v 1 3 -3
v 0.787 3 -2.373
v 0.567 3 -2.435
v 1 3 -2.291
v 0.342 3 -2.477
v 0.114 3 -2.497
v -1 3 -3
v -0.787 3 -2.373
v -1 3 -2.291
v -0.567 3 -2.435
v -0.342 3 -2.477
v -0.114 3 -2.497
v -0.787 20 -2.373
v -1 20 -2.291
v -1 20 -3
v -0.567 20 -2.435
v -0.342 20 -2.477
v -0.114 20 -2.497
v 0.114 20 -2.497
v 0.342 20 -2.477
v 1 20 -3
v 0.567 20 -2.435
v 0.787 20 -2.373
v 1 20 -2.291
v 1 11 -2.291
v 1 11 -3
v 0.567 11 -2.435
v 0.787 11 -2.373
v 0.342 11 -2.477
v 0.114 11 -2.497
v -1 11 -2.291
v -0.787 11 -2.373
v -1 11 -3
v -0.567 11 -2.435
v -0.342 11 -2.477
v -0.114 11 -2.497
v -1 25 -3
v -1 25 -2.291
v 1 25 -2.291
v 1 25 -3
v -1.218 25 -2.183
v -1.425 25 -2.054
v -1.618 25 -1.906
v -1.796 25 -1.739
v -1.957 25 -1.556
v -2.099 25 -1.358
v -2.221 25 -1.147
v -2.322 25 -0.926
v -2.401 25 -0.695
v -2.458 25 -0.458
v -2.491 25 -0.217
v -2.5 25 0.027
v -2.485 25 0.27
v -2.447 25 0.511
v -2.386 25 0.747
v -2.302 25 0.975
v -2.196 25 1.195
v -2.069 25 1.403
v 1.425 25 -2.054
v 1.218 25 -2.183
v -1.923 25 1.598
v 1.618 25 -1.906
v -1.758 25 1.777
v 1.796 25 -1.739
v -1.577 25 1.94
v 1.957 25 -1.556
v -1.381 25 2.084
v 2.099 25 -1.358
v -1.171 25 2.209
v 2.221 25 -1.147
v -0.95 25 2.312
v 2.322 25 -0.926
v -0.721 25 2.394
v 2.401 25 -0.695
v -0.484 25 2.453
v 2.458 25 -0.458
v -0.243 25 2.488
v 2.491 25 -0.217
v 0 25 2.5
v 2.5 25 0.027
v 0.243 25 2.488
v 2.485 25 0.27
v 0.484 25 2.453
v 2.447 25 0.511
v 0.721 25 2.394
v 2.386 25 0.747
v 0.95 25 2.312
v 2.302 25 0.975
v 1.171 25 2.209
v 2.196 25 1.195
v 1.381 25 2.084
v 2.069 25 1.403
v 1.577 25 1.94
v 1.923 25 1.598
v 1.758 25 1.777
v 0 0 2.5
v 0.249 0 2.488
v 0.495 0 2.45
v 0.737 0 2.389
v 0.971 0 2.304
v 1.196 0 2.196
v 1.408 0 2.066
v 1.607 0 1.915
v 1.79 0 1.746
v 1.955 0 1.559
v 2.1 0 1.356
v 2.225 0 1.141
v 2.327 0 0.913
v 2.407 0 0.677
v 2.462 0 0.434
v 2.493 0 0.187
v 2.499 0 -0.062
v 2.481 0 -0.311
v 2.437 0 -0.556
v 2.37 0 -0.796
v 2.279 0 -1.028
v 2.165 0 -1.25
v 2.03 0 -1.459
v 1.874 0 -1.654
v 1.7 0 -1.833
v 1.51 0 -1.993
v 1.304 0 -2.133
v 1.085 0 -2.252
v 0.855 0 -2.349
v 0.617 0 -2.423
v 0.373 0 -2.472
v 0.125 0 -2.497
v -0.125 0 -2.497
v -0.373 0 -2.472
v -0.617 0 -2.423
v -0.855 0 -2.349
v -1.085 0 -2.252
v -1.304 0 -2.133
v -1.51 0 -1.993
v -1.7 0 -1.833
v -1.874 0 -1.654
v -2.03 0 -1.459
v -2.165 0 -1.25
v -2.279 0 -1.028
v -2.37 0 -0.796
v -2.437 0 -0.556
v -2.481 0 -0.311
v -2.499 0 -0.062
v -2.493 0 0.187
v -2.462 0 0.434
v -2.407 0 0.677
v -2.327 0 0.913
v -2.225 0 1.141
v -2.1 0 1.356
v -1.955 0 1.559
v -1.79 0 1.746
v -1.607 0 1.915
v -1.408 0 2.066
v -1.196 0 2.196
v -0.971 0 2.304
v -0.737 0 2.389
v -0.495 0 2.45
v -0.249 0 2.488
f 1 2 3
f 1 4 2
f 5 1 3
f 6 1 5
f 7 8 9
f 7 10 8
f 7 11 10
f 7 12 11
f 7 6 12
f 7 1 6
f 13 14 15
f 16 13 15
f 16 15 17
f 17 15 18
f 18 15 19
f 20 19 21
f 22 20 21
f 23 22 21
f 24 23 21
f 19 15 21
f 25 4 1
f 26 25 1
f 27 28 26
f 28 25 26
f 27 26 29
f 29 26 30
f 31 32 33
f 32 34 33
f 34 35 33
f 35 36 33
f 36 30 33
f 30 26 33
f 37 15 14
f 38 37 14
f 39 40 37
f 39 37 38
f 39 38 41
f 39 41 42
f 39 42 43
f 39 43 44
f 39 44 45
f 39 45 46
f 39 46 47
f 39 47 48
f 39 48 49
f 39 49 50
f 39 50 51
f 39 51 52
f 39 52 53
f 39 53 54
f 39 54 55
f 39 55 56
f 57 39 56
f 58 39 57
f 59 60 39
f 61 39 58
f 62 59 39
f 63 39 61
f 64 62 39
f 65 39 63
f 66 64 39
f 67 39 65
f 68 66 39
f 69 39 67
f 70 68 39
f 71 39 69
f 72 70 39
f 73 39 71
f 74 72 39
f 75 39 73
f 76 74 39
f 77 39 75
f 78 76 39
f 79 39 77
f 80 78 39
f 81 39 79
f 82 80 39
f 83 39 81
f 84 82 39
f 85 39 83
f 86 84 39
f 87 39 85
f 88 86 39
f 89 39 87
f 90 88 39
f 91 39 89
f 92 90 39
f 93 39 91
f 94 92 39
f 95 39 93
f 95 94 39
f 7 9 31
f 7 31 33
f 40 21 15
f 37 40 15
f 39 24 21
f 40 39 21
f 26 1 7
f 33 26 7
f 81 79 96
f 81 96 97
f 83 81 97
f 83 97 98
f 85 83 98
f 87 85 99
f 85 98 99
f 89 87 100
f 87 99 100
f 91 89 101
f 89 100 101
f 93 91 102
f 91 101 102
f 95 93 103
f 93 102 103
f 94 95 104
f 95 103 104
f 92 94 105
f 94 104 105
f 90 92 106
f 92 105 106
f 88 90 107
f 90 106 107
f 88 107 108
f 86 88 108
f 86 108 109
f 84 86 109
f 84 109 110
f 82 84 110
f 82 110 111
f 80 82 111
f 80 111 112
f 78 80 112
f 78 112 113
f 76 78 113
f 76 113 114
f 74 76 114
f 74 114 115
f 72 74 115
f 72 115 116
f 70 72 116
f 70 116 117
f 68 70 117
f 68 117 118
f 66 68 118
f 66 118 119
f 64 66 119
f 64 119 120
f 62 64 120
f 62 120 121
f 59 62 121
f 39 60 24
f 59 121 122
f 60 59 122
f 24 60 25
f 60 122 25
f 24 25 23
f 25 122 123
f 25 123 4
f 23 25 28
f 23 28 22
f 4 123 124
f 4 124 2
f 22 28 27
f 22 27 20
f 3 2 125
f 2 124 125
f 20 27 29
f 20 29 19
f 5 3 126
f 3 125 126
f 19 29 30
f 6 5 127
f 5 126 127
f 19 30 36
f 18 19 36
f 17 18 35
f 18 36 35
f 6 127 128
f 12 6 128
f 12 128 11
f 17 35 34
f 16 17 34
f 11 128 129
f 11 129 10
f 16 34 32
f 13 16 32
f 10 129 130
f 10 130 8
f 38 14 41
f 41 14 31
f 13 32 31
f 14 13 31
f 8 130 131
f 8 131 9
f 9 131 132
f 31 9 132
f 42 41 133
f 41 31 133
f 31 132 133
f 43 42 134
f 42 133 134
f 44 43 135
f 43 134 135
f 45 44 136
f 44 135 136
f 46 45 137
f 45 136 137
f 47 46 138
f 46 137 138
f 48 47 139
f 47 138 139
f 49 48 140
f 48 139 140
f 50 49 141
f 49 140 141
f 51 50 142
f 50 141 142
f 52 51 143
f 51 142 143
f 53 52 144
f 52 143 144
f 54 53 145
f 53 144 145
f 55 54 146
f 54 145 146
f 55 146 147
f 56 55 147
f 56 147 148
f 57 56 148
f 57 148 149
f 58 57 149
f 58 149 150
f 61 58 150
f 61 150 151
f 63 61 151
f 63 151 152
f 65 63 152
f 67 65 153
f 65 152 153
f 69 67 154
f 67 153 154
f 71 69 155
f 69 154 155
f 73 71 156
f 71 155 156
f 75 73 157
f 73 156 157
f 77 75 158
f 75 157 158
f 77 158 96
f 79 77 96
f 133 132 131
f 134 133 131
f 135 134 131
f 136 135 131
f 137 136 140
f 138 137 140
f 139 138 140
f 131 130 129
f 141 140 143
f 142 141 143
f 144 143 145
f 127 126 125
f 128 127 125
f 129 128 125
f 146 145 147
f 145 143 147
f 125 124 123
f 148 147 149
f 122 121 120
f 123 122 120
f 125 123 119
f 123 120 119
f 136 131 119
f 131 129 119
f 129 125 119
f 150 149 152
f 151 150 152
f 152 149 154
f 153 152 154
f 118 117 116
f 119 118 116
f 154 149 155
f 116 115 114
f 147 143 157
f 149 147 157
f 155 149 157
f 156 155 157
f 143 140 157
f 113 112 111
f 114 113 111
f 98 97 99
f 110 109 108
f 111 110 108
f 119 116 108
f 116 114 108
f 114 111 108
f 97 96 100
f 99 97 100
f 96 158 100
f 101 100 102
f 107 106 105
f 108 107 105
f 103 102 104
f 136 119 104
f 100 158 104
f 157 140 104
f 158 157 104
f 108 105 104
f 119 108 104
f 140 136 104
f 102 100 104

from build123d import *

# Parameters (mm, degrees)
SKETCH_1_R      = 2.5
EXTRUDE_1_DEPTH = 25
SKETCH_2_W      = 2
SKETCH_2_H      = 1
EXTRUDE_2_DEPTH = 8
EXTRUDE_START   = -5
EXTRUDE_3_DEPTH = 5


with BuildPart() as part:
    # 草图1 → 凸台-拉伸1 (new body)
    with BuildSketch(Plane(origin=(0, 0, 0), x_dir=(1, 0, 0), z_dir=(0, 1, 0))):
        with Locations(Location((0, 0, 0), (0, 0, 270))):
            Circle(SKETCH_1_R)
    extrude(amount=EXTRUDE_1_DEPTH)

    # 草图2 → 凸台-拉伸2 (add)
    with BuildSketch(Plane(origin=(0, 3, 0), x_dir=(-1, 0, 0), z_dir=(0, -1, 0))):
        with Locations((0, 2.5)):
            Rectangle(SKETCH_2_W, SKETCH_2_H)
    extrude(amount=-EXTRUDE_2_DEPTH)

    # 草图3 → 凸台-拉伸3 (add)
    with BuildSketch(Plane(origin=(0, 25, 0), x_dir=(1, 0, 0), z_dir=(0, 1, 0)).offset(EXTRUDE_START)):
        with BuildLine():
            Line((-1, 3), (-1, 2.291287847))
            ThreePointArc((-1, 2.291287847), (0, 2.5), (1, 2.291287847))
            Line((1, 2.291287847), (1, 3))
            Line((1, 3), (-1, 3))
        make_face()
    extrude(amount=EXTRUDE_3_DEPTH)


solid = part.part
